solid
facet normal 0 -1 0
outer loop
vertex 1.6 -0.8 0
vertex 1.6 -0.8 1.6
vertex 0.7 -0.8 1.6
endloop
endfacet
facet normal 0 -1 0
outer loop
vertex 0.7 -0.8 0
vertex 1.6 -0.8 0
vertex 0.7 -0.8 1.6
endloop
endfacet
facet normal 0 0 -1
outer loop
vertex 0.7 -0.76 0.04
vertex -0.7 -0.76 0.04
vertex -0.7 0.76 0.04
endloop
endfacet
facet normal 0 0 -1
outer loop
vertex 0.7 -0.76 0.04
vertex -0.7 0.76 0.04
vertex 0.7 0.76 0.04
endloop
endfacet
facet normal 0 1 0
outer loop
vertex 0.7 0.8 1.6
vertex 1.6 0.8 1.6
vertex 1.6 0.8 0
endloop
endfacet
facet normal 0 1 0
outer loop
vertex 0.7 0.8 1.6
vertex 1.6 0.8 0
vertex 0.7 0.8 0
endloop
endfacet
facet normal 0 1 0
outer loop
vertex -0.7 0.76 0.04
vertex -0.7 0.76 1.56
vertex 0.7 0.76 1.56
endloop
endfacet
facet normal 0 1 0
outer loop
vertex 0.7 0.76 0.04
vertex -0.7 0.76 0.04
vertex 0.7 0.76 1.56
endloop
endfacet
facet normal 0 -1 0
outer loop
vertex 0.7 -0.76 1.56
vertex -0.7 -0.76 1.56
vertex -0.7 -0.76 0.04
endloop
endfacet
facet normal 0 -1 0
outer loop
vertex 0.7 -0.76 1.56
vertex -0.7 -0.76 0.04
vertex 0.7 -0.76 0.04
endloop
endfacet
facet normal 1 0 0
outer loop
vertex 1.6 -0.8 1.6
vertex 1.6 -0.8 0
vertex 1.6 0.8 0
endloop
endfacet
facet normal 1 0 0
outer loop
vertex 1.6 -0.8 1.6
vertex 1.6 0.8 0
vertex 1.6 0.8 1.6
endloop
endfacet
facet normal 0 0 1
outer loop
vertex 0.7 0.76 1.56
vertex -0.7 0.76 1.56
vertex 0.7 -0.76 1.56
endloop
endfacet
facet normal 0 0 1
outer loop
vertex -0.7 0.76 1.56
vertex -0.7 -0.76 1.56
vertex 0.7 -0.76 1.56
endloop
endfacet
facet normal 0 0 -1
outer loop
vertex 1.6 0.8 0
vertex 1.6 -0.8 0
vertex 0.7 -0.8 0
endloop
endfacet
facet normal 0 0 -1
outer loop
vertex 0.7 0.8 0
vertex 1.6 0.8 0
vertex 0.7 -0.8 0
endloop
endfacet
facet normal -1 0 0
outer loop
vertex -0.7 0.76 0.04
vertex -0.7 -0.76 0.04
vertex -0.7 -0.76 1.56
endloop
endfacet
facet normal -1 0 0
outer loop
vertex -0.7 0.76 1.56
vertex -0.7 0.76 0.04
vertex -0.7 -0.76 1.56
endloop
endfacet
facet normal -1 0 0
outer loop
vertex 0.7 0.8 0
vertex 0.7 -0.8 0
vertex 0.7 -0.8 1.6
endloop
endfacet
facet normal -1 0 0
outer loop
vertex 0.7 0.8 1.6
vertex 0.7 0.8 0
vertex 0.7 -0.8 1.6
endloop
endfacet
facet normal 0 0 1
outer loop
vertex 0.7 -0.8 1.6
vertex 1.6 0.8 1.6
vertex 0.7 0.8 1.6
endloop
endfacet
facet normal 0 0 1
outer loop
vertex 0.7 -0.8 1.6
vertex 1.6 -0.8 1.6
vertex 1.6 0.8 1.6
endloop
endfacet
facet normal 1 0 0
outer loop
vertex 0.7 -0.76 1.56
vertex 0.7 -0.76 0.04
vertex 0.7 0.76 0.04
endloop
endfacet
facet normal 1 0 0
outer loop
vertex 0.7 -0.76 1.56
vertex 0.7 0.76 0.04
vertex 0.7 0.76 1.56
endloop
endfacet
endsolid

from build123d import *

# Parameters (mm, degrees)
SKETCH001_W  = 1.4
SKETCH001_H  = 1.52
PAD001_DEPTH = 0.76
SKETCH_W     = 0.9
SKETCH_H     = 1.6
PAD_DEPTH    = 0.8


with BuildPart() as capacitor_body:
    # Sketch001 → Pad001 (new body, symmetric)
    with BuildSketch(Plane.XZ):
        with Locations((0, 0.8)):
            Rectangle(SKETCH001_W, SKETCH001_H)
    extrude(amount=PAD001_DEPTH, both=True)


with BuildPart() as terminator_left:
    # Sketch → Pad (new body, symmetric)
    with BuildSketch(Plane.XZ):
        with Locations((-1.15, 0.8)):
            Rectangle(SKETCH_W, SKETCH_H)
    extrude(amount=PAD_DEPTH, both=True)


with BuildPart() as terminator_right:
    # mirror: instance of Terminator Left
    add(terminator_left.part.mirror(Plane(origin=(0, 0, 0), x_dir=(0, -1, 0), z_dir=(1, 0, 0))))


solid = Compound([capacitor_body.part, terminator_right.part])
